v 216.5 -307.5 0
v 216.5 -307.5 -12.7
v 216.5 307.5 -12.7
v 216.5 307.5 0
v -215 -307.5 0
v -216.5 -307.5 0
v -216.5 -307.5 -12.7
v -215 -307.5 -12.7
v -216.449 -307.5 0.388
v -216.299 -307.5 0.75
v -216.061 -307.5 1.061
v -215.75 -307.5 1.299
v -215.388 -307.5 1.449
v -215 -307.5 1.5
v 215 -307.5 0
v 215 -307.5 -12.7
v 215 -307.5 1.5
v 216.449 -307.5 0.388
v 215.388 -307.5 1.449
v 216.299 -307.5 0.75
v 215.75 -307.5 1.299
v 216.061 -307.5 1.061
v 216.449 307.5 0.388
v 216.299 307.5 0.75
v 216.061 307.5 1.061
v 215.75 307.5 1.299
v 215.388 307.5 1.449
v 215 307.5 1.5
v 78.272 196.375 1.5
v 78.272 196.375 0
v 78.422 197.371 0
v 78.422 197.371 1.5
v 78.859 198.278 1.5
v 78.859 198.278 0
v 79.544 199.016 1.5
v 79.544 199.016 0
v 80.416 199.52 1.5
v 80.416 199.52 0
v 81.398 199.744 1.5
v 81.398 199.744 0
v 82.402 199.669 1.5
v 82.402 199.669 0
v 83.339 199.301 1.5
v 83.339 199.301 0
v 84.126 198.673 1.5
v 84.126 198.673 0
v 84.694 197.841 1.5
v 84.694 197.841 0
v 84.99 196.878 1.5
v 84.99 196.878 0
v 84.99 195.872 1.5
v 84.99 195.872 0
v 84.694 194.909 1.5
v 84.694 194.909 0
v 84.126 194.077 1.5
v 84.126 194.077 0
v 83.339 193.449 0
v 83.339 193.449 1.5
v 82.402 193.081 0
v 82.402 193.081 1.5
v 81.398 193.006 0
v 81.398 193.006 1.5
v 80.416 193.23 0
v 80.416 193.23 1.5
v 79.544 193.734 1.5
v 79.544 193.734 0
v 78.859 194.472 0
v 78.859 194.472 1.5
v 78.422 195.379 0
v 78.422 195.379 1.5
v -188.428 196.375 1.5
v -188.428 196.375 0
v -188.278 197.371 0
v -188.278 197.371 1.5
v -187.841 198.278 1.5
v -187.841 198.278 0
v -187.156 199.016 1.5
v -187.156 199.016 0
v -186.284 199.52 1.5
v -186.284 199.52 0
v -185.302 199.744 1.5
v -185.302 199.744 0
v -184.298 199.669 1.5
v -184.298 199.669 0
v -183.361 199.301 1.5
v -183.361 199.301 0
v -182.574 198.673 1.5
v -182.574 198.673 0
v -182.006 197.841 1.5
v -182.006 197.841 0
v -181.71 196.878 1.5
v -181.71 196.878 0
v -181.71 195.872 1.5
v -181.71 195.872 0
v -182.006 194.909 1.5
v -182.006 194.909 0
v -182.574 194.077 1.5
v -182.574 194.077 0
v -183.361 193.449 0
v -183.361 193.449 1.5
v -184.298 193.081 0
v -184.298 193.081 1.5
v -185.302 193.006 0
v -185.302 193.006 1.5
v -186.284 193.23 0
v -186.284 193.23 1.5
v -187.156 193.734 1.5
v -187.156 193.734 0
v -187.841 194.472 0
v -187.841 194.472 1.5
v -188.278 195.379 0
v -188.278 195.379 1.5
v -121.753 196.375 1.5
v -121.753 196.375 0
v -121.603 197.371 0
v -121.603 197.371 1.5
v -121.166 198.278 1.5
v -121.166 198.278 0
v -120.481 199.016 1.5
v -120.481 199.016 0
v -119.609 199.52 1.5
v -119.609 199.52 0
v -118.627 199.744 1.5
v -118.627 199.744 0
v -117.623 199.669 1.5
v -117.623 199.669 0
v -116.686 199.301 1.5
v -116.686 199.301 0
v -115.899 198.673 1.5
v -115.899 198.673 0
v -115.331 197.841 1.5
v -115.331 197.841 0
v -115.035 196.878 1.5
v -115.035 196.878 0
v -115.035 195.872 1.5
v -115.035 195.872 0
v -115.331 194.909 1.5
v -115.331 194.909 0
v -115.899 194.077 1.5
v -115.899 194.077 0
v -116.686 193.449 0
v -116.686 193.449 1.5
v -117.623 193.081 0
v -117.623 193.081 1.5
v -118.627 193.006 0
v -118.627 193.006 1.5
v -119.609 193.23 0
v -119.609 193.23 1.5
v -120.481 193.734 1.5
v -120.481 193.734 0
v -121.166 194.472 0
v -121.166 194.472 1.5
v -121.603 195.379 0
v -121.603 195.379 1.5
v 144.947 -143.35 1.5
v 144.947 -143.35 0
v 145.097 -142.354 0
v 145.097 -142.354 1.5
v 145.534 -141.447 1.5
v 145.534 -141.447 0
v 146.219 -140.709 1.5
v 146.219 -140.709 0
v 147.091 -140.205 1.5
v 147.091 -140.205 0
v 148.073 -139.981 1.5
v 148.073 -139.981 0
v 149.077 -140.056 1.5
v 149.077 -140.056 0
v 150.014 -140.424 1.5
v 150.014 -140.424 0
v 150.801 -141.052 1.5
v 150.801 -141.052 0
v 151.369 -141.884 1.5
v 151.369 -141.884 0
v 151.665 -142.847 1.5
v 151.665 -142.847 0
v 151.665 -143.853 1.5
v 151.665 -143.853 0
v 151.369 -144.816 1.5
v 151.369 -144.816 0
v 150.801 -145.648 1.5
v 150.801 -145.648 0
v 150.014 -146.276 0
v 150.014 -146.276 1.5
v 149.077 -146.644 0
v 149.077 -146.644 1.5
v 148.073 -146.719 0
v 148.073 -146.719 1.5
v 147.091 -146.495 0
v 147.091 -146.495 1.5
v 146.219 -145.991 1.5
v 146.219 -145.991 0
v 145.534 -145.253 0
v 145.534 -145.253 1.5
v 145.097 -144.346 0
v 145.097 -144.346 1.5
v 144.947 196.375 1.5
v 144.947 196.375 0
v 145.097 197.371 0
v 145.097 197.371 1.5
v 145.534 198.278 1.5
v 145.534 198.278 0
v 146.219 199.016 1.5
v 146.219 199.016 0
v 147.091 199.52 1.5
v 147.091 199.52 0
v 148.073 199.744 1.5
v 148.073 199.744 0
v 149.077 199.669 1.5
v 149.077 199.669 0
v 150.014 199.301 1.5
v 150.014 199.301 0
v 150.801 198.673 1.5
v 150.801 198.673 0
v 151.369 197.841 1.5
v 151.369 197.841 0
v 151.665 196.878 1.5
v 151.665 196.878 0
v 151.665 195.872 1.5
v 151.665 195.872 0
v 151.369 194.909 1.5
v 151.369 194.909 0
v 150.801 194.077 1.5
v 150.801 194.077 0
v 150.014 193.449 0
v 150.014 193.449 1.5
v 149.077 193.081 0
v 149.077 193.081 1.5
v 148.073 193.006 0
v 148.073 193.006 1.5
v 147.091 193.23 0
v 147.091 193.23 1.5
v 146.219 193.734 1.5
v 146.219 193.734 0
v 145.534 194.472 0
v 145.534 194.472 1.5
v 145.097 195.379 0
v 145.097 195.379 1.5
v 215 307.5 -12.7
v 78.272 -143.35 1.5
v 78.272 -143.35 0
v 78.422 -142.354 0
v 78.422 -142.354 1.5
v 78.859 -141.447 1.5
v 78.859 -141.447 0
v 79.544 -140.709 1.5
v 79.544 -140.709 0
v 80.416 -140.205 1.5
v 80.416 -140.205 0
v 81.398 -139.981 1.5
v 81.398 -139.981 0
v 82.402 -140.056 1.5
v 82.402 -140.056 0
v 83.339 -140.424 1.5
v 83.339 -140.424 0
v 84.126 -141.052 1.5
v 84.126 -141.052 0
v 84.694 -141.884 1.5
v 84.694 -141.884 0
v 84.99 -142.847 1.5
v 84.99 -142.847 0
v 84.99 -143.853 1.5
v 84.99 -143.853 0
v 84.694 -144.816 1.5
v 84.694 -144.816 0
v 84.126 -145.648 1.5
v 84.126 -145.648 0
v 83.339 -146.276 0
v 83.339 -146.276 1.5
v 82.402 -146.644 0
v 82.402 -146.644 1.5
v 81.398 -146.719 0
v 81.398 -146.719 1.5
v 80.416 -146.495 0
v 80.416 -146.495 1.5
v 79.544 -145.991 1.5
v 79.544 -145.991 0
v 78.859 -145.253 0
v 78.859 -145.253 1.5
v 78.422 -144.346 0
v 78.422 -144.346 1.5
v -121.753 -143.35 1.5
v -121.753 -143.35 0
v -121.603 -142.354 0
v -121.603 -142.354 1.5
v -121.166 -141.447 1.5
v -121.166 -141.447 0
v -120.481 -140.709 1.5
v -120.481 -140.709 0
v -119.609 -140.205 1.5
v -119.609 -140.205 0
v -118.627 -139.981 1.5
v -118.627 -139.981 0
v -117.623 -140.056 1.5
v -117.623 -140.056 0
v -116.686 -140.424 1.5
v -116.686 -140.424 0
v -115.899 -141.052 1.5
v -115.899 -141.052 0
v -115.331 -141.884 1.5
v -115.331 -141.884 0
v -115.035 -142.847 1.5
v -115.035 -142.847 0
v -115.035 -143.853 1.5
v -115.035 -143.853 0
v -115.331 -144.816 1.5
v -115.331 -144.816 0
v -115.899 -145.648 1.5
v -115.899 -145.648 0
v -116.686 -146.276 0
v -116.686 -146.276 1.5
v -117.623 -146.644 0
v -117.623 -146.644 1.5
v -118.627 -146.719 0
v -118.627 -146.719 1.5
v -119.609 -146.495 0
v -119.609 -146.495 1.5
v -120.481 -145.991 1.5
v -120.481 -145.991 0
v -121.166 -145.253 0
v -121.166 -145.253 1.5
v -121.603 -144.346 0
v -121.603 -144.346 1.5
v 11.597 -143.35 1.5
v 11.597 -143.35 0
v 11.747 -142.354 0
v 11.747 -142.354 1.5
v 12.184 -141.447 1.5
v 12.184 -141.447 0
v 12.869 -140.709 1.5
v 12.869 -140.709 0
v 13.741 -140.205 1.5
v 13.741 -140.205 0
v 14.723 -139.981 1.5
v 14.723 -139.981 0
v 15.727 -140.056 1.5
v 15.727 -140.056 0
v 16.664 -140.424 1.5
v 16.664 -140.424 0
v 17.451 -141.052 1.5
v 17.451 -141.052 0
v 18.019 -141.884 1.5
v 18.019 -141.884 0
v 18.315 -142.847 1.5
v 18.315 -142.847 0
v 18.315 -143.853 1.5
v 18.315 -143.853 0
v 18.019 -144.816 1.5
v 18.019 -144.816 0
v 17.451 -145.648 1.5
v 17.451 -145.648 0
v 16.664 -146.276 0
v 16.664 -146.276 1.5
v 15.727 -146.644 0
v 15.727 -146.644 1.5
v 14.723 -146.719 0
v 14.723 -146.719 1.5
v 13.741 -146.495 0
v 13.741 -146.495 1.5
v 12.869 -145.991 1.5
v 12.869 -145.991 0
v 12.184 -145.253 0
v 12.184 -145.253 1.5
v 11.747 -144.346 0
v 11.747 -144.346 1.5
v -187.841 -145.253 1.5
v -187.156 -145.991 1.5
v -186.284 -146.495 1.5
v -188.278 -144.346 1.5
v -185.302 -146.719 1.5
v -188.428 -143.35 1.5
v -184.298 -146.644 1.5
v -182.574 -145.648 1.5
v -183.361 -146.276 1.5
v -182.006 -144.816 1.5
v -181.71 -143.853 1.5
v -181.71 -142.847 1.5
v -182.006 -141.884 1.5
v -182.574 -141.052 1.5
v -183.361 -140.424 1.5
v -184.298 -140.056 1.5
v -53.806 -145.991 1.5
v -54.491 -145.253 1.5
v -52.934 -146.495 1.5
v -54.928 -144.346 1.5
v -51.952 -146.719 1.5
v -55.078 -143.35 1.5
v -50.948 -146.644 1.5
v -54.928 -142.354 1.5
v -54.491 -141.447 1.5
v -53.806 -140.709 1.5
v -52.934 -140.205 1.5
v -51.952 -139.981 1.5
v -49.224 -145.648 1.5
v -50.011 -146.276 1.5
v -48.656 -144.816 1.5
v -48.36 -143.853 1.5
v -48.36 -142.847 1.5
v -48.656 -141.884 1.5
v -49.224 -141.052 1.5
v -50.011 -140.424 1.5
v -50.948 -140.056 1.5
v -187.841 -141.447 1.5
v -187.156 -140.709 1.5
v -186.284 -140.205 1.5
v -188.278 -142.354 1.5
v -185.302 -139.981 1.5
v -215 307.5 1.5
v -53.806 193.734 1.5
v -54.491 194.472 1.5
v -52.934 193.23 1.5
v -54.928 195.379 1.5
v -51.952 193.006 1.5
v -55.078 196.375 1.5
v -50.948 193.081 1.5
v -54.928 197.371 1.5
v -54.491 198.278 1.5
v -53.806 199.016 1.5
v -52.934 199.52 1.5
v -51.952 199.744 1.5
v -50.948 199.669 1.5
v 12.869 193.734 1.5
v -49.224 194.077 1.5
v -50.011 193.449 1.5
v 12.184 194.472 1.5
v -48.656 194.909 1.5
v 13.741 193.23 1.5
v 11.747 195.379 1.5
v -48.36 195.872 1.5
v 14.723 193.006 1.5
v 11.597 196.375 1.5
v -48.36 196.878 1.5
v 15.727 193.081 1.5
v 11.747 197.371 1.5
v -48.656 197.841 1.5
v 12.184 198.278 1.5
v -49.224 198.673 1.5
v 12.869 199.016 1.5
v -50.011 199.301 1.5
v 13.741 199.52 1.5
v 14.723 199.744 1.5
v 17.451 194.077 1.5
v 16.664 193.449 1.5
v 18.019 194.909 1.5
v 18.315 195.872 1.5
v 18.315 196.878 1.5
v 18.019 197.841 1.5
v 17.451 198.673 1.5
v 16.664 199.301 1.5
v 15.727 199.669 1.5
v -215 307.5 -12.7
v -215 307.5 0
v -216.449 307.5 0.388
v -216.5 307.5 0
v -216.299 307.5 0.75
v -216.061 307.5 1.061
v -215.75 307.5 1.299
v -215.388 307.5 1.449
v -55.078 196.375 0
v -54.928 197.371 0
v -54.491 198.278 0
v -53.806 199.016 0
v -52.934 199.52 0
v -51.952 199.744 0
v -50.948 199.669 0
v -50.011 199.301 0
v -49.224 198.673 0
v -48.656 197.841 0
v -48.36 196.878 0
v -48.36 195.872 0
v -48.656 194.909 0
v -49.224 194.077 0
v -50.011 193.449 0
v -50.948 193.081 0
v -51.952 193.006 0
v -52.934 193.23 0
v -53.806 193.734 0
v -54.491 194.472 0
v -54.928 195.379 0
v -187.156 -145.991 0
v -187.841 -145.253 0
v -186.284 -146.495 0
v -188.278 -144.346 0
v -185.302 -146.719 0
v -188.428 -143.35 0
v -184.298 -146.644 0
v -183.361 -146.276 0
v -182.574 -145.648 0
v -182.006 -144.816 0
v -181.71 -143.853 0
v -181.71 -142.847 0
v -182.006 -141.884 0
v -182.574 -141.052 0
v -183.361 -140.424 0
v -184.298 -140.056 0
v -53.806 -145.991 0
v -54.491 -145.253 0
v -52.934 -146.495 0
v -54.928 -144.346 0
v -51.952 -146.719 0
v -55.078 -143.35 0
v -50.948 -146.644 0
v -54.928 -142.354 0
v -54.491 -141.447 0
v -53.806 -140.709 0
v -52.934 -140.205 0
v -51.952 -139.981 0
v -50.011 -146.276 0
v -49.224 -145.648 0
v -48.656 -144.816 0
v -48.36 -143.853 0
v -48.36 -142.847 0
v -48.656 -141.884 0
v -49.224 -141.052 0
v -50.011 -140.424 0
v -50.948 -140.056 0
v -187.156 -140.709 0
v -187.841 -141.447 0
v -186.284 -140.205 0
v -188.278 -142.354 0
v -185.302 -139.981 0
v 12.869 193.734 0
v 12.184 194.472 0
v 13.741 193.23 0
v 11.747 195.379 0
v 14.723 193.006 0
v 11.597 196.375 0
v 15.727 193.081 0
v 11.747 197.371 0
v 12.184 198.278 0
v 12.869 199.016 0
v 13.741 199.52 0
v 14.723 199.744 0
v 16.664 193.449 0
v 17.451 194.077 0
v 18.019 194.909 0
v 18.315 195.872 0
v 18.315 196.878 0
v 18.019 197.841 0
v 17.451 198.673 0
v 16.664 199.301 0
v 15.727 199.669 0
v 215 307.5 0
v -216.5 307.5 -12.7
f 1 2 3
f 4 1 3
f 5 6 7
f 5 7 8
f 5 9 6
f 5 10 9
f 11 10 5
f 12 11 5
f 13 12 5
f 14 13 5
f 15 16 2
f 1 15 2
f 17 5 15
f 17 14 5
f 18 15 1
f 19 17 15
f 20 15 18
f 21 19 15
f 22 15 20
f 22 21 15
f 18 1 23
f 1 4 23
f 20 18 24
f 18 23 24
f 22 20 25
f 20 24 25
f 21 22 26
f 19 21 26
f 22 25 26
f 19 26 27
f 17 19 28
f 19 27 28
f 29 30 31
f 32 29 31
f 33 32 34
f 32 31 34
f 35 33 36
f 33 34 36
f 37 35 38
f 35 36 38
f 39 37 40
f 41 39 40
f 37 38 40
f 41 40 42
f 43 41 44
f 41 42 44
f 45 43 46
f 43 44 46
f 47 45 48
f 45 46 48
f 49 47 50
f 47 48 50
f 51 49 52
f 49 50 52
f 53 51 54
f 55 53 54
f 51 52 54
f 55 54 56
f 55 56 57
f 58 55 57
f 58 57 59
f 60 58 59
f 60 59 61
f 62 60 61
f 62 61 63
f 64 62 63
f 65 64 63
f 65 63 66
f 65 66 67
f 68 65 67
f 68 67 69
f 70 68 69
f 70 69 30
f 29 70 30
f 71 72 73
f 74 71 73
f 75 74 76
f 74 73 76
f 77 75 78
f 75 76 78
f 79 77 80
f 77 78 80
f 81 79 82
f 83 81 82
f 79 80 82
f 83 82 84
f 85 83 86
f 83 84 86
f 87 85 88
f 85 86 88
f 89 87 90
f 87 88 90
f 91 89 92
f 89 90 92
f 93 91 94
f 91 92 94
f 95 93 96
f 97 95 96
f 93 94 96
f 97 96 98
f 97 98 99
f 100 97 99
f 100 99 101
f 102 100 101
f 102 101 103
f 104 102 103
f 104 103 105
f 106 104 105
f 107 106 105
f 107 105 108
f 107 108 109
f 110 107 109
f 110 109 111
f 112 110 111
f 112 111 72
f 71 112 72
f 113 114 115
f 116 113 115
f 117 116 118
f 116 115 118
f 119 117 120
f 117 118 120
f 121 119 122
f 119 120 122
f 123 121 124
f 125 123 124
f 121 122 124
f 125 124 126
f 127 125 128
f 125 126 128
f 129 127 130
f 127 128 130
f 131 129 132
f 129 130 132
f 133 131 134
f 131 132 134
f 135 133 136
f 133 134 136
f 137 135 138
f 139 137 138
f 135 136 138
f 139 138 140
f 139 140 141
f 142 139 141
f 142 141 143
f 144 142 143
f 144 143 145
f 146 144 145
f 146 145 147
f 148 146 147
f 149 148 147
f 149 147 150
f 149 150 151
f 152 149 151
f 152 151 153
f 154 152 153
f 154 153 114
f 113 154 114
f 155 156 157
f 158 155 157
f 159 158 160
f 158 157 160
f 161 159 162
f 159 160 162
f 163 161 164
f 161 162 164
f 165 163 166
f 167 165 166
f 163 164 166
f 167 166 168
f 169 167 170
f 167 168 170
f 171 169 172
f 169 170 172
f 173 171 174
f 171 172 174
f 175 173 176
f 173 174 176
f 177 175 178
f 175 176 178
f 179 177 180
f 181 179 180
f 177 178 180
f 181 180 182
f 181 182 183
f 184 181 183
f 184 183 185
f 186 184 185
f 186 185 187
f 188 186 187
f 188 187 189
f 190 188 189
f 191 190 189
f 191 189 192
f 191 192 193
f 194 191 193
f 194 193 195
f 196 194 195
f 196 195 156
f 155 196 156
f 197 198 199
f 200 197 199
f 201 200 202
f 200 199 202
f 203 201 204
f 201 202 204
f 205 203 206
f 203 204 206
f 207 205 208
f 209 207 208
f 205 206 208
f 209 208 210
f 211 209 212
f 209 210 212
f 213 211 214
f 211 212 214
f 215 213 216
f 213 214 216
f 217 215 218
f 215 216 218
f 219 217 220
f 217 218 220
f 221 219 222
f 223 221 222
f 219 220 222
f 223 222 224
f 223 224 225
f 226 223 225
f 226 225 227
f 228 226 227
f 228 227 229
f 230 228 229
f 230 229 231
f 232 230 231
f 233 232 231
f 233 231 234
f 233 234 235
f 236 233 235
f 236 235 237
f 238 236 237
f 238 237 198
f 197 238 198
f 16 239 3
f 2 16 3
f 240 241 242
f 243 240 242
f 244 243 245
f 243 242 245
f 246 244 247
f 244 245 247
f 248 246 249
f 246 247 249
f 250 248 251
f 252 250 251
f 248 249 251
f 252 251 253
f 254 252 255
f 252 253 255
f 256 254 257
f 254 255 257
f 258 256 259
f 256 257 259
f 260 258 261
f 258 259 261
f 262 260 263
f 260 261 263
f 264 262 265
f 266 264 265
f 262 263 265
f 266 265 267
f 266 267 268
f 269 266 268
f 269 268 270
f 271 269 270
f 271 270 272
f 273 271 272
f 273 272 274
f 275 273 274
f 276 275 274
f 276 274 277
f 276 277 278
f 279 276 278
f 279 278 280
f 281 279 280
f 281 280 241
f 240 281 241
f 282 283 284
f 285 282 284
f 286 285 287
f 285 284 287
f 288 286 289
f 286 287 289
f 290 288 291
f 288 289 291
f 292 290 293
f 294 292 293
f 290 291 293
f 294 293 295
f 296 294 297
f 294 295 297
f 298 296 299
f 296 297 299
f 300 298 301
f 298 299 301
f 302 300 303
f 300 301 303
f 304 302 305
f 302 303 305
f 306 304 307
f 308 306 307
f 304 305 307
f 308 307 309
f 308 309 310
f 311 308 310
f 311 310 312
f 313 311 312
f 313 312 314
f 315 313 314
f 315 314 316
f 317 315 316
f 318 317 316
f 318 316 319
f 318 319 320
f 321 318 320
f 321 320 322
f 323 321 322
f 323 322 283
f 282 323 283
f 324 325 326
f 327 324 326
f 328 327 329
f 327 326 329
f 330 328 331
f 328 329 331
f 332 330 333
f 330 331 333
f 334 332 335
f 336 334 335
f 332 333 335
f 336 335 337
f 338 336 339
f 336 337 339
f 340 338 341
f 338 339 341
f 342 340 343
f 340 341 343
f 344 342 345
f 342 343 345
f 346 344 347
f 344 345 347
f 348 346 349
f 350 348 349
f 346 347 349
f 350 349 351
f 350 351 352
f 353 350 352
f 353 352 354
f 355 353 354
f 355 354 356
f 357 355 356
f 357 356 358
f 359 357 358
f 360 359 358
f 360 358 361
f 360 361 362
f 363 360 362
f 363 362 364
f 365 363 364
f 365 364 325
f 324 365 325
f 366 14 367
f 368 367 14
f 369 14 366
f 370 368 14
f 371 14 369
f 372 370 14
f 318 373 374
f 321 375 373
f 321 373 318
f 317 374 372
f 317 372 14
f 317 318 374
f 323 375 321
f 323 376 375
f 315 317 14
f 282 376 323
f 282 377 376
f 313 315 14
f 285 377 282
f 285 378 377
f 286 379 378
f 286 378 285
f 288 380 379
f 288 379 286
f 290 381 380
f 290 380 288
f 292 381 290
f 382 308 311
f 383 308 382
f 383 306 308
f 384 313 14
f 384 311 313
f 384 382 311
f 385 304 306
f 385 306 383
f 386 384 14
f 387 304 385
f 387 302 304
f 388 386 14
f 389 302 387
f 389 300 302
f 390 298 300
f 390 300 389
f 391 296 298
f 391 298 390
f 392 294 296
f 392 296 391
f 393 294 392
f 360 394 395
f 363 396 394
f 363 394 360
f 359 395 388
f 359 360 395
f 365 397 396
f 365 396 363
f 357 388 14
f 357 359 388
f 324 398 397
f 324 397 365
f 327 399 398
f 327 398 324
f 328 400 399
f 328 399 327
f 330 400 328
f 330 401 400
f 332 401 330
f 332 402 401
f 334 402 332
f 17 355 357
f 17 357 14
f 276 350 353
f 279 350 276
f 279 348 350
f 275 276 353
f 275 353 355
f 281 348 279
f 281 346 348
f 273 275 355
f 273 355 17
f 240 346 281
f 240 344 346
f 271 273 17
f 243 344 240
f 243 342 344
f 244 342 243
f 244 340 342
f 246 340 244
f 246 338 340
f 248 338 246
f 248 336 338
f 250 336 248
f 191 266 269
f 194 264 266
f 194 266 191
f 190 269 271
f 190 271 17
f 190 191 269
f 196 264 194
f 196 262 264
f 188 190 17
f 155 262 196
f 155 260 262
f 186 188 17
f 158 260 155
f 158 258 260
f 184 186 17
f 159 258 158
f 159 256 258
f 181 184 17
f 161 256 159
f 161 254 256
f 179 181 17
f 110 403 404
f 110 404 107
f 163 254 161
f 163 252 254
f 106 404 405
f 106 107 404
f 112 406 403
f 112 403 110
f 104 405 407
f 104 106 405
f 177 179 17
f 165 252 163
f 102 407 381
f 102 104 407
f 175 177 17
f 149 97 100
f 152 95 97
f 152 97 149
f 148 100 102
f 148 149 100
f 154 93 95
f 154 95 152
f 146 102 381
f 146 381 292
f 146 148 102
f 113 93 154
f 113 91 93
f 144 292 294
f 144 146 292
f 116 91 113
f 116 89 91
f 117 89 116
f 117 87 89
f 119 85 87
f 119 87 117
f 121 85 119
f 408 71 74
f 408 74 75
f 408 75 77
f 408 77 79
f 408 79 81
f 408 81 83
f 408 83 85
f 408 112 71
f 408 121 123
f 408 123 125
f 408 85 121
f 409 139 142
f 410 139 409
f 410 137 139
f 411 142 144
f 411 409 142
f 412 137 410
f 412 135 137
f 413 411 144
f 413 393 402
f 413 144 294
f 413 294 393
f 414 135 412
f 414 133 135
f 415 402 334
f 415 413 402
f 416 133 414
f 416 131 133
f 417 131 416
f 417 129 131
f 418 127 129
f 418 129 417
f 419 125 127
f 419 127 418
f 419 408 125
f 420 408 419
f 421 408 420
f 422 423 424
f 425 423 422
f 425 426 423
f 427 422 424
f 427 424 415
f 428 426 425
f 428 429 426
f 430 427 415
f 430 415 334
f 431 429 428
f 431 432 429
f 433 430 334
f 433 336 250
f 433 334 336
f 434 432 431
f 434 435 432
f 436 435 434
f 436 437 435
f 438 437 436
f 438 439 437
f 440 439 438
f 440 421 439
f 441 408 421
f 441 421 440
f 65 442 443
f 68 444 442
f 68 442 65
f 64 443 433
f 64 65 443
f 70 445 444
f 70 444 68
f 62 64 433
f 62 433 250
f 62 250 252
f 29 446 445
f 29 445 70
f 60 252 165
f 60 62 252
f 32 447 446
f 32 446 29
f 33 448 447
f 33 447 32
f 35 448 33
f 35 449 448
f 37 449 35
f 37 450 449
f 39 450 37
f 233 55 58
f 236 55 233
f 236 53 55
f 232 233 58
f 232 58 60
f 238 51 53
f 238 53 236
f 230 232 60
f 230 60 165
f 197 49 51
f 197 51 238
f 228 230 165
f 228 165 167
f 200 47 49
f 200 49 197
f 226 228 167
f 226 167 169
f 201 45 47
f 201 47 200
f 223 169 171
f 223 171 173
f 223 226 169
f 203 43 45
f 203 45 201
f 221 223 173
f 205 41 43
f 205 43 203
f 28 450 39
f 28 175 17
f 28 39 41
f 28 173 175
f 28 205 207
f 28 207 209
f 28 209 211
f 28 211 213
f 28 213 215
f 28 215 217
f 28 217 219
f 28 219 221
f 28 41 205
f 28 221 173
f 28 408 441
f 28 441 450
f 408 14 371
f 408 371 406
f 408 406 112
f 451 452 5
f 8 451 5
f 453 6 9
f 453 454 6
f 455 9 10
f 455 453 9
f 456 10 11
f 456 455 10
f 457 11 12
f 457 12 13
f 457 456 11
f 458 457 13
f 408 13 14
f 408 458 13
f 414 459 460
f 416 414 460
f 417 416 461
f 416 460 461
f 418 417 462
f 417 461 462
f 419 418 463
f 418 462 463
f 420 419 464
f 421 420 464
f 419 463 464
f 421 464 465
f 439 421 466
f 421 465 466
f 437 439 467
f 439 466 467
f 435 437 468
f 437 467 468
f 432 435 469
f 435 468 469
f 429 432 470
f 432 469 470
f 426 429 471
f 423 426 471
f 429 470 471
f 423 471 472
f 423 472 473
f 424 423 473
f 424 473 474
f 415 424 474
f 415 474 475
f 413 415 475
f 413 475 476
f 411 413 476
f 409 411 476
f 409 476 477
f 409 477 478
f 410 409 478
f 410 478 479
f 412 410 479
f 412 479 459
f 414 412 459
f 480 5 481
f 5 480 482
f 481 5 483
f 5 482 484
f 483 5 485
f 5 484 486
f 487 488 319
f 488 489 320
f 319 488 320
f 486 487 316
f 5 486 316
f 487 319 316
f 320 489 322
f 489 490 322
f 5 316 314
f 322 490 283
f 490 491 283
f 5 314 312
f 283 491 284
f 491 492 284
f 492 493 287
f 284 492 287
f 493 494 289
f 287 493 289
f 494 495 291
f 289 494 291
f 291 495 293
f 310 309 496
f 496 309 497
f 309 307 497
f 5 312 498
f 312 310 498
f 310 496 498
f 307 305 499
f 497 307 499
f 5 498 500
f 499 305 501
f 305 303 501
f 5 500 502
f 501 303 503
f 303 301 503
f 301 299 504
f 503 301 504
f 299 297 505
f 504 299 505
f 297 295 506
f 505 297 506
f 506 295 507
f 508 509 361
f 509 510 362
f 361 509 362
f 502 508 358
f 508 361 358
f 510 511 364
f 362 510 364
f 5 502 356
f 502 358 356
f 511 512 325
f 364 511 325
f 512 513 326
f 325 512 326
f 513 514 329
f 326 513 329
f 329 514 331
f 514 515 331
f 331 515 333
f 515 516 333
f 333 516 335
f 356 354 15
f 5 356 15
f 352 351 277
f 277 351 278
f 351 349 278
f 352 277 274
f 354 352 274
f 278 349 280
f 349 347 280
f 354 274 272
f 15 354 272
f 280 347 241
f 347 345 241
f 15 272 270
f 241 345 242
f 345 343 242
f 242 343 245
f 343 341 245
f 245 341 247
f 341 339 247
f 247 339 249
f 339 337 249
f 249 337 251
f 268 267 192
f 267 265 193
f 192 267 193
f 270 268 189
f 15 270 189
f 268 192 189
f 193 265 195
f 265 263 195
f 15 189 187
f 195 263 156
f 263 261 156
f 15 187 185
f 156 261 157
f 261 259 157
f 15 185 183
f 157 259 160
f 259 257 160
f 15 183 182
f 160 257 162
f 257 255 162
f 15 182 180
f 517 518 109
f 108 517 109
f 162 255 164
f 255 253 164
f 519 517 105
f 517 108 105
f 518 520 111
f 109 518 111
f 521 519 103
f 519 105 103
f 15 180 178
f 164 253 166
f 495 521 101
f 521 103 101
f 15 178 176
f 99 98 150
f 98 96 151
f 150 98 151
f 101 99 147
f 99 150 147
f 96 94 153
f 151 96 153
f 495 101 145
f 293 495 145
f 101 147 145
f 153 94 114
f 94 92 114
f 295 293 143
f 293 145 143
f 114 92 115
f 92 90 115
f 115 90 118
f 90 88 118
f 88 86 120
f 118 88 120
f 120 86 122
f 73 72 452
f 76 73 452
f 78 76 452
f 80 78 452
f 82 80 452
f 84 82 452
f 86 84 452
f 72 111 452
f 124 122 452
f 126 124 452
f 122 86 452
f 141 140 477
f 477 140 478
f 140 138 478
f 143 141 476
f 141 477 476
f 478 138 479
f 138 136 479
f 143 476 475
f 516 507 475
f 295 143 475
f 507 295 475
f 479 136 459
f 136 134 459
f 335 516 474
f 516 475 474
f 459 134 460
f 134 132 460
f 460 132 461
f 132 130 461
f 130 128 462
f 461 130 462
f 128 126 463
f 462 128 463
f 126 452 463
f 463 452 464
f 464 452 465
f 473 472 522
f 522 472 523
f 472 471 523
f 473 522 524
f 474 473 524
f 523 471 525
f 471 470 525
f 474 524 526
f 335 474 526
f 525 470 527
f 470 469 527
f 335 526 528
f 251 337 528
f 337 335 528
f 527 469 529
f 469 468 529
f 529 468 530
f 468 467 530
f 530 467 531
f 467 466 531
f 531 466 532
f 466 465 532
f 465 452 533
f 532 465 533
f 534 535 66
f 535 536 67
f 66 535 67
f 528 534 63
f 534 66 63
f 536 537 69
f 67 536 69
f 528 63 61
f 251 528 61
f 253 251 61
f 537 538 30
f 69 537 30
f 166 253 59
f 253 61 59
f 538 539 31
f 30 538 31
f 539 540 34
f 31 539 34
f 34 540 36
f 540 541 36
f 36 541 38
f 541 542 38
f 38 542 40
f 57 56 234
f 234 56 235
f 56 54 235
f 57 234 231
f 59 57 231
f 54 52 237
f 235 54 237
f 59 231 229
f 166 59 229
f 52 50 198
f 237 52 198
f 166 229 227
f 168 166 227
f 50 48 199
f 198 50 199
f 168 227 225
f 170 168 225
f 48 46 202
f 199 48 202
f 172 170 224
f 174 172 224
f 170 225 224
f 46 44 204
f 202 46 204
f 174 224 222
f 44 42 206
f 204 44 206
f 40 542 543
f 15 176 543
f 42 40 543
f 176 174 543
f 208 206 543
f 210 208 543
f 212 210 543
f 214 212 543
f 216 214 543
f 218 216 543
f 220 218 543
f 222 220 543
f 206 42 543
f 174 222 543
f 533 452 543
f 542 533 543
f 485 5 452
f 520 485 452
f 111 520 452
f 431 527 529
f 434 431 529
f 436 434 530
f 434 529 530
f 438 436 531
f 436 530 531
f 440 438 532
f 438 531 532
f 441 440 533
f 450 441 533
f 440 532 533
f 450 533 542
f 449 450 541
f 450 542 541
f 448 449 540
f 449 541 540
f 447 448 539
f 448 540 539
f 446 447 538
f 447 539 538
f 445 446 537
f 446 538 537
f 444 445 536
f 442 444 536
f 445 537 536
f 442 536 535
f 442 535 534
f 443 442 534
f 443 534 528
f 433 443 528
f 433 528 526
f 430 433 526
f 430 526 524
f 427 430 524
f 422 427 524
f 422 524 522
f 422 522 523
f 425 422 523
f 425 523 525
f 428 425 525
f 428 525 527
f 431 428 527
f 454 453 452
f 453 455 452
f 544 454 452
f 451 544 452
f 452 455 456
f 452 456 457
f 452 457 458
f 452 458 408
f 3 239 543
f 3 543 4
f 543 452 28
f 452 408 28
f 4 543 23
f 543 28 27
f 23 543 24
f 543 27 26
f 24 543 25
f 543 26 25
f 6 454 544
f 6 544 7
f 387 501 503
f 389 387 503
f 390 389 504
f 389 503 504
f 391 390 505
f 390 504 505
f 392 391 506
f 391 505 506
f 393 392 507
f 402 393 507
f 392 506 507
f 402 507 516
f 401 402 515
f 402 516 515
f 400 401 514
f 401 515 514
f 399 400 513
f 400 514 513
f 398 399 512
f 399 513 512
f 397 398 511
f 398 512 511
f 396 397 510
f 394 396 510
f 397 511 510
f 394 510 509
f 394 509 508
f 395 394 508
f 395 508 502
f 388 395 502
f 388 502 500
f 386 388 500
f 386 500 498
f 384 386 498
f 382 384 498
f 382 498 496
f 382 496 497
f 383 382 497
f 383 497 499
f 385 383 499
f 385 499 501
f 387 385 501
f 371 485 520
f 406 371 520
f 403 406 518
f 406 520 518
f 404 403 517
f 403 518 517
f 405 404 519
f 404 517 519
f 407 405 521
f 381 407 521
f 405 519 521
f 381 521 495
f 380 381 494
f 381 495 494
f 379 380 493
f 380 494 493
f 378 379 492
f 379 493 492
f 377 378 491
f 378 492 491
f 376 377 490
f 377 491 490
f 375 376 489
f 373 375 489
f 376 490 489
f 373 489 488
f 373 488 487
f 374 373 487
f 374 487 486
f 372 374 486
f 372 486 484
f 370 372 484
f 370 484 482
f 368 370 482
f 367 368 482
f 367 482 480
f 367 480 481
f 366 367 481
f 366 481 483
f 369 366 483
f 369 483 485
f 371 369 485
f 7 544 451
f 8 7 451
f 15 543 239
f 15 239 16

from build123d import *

# Parameters (mm, degrees)
F0_W     = 433
F0_H     = 615
F1_DEPTH = 1.5
F2_W     = 1.5
F2_H     = 615
F3_DEPTH = 12.7
F4_R     = 1.5
F6_D     = 6.7564


with BuildPart() as f1:
    # F0 (on Top) → F1 (new body)
    with BuildSketch(Plane.XY):
        Rectangle(F0_W, F0_H)
    extrude(amount=F1_DEPTH)

    # F2 (on face) → F3 (join)
    with BuildSketch(Plane(origin=(0, 0, 0), x_dir=(1, 0, 0), z_dir=(0, 0, -1))):
        with Locations((-215.75, 0)):
            Rectangle(F2_W, F2_H)
        with Locations((215.75, 0)):
            Rectangle(F2_W, F2_H)
    extrude(amount=F3_DEPTH)

    # F4
    f4_edges = [f1.edges().sort_by_distance(p)[0] for p in [
        (-216.5, 0, 1.5),
        (216.5, 0, 1.5),
    ]]
    fillet(f4_edges, radius=F4_R)

    # F6 (through all)
    with Locations(Plane.XY.offset(1.5)):
        with Locations((-118.375, 196.375), (-51.7, 196.375), (14.975, 196.375), (81.65, 196.375), (148.325, 196.375), (148.325, -143.35), (81.65, -143.35), (14.975, -143.35), (-51.7, -143.35), (-118.375, -143.35), (-185.05, 196.375), (-185.05, -143.35)):
            Hole(F6_D / 2)


solid = f1.part
